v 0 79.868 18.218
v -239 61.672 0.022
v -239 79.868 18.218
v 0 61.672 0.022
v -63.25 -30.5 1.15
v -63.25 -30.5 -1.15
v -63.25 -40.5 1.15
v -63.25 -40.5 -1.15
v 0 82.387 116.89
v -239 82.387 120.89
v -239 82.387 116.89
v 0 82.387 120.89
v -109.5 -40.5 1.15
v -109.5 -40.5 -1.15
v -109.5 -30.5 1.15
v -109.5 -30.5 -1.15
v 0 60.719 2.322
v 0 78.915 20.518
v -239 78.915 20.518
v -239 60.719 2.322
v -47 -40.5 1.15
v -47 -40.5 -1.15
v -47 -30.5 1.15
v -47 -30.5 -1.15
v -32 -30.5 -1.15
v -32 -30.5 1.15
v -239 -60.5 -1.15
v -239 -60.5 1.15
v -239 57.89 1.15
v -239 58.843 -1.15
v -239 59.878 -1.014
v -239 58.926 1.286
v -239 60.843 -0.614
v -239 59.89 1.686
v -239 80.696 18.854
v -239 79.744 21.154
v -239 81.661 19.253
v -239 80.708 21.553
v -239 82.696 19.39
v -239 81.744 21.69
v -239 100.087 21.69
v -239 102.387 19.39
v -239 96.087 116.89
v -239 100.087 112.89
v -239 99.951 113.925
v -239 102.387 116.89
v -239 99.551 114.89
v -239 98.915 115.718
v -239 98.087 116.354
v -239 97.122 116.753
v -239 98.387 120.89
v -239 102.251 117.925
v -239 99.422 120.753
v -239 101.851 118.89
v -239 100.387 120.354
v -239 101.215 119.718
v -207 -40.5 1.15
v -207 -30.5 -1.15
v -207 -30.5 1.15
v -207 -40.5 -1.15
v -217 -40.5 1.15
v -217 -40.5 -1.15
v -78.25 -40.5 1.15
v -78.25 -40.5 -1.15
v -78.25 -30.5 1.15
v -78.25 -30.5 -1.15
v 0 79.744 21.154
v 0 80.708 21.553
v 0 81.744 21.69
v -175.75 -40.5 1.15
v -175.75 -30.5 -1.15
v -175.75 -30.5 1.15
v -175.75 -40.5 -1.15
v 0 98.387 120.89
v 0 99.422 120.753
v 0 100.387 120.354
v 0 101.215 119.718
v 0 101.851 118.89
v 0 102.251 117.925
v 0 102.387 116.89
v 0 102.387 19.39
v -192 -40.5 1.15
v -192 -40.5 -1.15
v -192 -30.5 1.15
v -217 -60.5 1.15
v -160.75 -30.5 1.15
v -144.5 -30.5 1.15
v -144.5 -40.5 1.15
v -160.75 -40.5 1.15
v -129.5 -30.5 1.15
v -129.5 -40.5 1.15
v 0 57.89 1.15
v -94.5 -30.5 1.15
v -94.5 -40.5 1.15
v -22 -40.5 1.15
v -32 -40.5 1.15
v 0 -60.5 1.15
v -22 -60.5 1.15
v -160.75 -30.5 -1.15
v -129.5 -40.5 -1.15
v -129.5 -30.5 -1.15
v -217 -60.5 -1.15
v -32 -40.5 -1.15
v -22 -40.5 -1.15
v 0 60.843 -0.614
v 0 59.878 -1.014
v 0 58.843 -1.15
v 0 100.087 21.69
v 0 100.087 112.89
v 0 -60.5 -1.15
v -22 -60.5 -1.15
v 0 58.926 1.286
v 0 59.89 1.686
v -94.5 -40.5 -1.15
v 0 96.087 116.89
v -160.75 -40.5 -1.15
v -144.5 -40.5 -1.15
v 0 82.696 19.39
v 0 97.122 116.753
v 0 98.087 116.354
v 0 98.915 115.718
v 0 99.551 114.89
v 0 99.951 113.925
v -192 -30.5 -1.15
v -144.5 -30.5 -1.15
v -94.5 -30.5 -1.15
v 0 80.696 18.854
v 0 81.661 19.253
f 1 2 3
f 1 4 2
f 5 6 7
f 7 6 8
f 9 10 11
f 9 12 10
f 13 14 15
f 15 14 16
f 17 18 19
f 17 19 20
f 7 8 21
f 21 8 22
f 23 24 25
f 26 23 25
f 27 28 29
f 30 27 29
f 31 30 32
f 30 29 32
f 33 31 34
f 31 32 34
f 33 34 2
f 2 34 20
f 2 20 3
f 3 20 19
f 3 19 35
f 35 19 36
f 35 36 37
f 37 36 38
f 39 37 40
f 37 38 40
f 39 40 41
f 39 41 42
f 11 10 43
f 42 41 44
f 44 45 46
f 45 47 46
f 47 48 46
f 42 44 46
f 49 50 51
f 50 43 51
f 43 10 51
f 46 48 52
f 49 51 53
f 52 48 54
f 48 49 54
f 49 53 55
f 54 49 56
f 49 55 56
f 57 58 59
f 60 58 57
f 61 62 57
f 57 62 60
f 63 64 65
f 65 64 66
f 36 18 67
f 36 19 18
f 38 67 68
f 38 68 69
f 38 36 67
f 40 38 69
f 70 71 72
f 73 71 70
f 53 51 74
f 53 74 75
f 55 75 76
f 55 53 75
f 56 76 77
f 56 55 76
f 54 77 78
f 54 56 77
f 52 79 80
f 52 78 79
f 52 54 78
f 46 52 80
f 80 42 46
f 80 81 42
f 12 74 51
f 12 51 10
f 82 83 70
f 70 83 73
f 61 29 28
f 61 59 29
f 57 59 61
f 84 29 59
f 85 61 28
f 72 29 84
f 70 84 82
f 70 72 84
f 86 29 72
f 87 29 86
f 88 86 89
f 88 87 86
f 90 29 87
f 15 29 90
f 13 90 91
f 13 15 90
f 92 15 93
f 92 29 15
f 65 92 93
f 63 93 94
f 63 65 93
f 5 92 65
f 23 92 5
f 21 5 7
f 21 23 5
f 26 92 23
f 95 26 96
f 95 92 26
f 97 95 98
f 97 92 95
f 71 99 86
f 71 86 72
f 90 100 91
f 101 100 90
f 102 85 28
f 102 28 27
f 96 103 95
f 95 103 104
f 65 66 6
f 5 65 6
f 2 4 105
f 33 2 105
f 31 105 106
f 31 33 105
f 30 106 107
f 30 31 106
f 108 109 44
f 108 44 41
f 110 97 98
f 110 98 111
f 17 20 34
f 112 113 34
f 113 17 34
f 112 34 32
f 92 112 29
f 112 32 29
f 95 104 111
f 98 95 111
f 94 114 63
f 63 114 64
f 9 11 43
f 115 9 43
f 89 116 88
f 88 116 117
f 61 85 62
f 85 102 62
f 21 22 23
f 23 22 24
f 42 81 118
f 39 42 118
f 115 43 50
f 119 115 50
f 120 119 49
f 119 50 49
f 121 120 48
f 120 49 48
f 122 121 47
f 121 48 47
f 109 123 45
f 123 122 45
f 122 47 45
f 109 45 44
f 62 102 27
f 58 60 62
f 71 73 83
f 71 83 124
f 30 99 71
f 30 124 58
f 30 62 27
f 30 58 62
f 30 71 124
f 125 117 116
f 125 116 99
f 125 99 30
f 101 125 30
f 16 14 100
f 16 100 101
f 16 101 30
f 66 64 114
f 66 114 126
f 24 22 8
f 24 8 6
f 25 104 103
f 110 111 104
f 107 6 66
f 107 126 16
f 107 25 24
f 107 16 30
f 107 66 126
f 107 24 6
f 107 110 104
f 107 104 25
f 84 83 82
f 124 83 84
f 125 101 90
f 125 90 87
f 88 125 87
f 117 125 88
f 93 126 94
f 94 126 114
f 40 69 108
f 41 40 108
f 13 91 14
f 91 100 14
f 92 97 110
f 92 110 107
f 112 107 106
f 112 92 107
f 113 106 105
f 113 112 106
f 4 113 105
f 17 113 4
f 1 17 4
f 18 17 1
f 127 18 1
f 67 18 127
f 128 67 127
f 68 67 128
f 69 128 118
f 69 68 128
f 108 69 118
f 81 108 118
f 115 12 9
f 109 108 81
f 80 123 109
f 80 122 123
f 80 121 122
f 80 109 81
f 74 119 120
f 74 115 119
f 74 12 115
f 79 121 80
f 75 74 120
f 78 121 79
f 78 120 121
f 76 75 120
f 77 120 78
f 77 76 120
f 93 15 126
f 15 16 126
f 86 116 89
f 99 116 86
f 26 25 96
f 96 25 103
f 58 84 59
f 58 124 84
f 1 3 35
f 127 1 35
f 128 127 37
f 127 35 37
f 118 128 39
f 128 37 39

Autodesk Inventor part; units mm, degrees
ref_plane "YZ Plane" through (0, 0, 0) normal (1, 0, 0) x (0, 1, 0)
ref_plane "XZ Plane" through (0, 0, 0) normal (0, 1, 0) x (-1, 0, 0)
ref_plane "XY Plane" through (0, 0, 0) normal (0, 0, 1) x (1, 0, 0)
sketch "Sketch1" plane through (0, 0, 0) normal (1, 0, 0) x (0, 1, 0)
  line L0 (60.5, 1.15) -> (-60.5, 1.15)
  line L1 (-60.5, 1.15) -> (-60.5, -1.15)
  line L2 (-60.5, -1.15) -> (60.5, -1.15)
  line L3 (60.5, -1.15) -> (60.5, 1.15)
  line L4 (60.5, 1.15) -> (-60.5, -1.15) construction
  line L5 (-60.5, 1.15) -> (60.5, -1.15) construction
  line L6 (60.5, -1.15) -> (81.7132, 20.0632)
  line L7 (60.5, -1.15) -> (90.5, -1.15) construction
  line L8 (81.7132, 20.0632) -> (80.0869, 21.6895)
  line L9 (80.0869, 21.6895) -> (59.5288, 1.1315)
  line L10 (80.0869, 21.6895) -> (100.0869, 21.6895)
  line L11 (100.0869, 21.6895) -> (100.0869, 19.3895)
  line L12 (100.0869, 19.3895) -> (81.0395, 19.3895)
  line L13 (100.0869, 19.3895) -> (102.3869, 19.3895)
  line L14 (102.3869, 19.3895) -> (102.3869, 120.8895)
  line L15 (102.3869, 120.8895) -> (100.0869, 120.8895)
  line L16 (100.0869, 120.8895) -> (100.0869, 19.3895)
  line L17 (102.3869, 120.8895) -> (82.3869, 120.8895)
  line L18 (82.3869, 120.8895) -> (82.3869, 116.8895)
  line L19 (82.3869, 116.8895) -> (102.3869, 116.8895)
  line L20 (102.3869, 116.8895) -> (102.3869, 120.8895)
  point P0 (0, 0)
  point P1 (59.5473, 1.15)
  point P2 (100.0869, 116.8895)
  point P3 (100.0869, 21.6895)
  dimension "d0" = 121
  dimension "d1" = 2.3
  dimension "d2" = 30
  dimension "d3" = 45
  dimension "d4" = 2.3
  dimension "d5" = 20
  dimension "d6" = 2.3
  dimension "d7" = 2.3
  dimension "d8" = 101.5
  dimension "d9" = 20
  dimension "d10" = 4
extrude "Extrusion1" add sketch "Sketch1" against normal blind 239
fillet "Fillet1" radius 4 1 edges at (-119.5, 60.5, -1.15)
fillet "Fillet2" radius 4 5 edges at (-119.5, 59.5473, 1.15) (-119.5, 81.0395, 19.3895) (-119.5, 80.0869, 21.6895) (-119.5, 102.3869, 120.8895) (-119.5, 100.0869, 116.8895)
sketch "Sketch2" plane through (0, -60.5, -1.15) normal (0, 0, -1) x (-1, 0, 0)
  line L0 (22, -20) -> (217, -20)
  line L1 (217, -20) -> (217, 20)
  line L2 (217, 20) -> (22, 20)
  line L3 (22, 20) -> (22, -20)
  line L4 (0, 0) -> (239, 0) projected
  line L5 (22, -20) -> (217, 20) construction
  line L6 (217, -20) -> (22, 20) construction
  line L7 (239, 119.3431) -> (239, 0) projected
  line L8 (0, 0) -> (0, 119.3431) projected
  line L9 (119.5, 20) -> (119.5, 119.3431) construction
  line L10 (119.5, 119.3431) -> (119.5, 0) construction
  line L11 (32, 20) -> (47, 20) construction
  line L12 (47, 20) -> (47, 30)
  line L13 (47, 30) -> (32, 30)
  line L14 (32, 30) -> (32, 20)
  line L15 (32, 20) -> (47, 20) construction
  line L16 (55.3012, 20) -> (70.3012, 20)
  line L17 (94.5, 20) -> (109.5, 20)
  line L18 (109.5, 20) -> (109.5, 30)
  line L19 (109.5, 30) -> (94.5, 30)
  line L20 (94.5, 30) -> (94.5, 20)
  line L21 (63.25, 20) -> (78.25, 20)
  line L22 (78.25, 20) -> (78.25, 30)
  line L23 (78.25, 30) -> (63.25, 30)
  line L24 (63.25, 30) -> (63.25, 20)
  line L25 (47, 30) -> (63.25, 30) construction
  line L26 (78.25, 30) -> (94.5, 30) construction
  line L27 (192, 20) -> (192, 30)
  line L28 (192, 30) -> (207, 30)
  line L29 (207, 30) -> (207, 20)
  line L30 (129.5, 20) -> (129.5, 30)
  line L31 (129.5, 30) -> (144.5, 30)
  line L32 (144.5, 30) -> (144.5, 20)
  line L33 (160.75, 20) -> (160.75, 30)
  line L34 (160.75, 30) -> (175.75, 30)
  line L35 (175.75, 30) -> (175.75, 20)
  point P0 (0, 60.5)
  point P1 (22, 0)
  point P2 (217, 0)
  point P3 (109.5, 20)
  point P4 (192, 20)
  point P5 (207, 20)
  point P6 (160.75, 20)
  dimension "d15" = 195
  dimension "d16" = 40
  dimension "d19" = 22
  dimension "d20" = 22
  dimension "d21" = 15
  dimension "d22" = 10
  dimension "d25" = 15
  dimension "d26" = 10
  dimension "d27" = 10
  dimension "d28" = 10
  dimension "d31" = 15
  dimension "d32" = 10
extrude "Extrusion2" cut sketch "Sketch2" against normal blind 10 contours L3 L2 L1 L4 | L14 L13 L12 L2 | L2 L27 L28 L29 | L2 L33 L34 L35 | L24 L23 L22 L2 | L2 L30 L31 L32 | L20 L19 L18 L2
properties part number "controlbox_cover"
